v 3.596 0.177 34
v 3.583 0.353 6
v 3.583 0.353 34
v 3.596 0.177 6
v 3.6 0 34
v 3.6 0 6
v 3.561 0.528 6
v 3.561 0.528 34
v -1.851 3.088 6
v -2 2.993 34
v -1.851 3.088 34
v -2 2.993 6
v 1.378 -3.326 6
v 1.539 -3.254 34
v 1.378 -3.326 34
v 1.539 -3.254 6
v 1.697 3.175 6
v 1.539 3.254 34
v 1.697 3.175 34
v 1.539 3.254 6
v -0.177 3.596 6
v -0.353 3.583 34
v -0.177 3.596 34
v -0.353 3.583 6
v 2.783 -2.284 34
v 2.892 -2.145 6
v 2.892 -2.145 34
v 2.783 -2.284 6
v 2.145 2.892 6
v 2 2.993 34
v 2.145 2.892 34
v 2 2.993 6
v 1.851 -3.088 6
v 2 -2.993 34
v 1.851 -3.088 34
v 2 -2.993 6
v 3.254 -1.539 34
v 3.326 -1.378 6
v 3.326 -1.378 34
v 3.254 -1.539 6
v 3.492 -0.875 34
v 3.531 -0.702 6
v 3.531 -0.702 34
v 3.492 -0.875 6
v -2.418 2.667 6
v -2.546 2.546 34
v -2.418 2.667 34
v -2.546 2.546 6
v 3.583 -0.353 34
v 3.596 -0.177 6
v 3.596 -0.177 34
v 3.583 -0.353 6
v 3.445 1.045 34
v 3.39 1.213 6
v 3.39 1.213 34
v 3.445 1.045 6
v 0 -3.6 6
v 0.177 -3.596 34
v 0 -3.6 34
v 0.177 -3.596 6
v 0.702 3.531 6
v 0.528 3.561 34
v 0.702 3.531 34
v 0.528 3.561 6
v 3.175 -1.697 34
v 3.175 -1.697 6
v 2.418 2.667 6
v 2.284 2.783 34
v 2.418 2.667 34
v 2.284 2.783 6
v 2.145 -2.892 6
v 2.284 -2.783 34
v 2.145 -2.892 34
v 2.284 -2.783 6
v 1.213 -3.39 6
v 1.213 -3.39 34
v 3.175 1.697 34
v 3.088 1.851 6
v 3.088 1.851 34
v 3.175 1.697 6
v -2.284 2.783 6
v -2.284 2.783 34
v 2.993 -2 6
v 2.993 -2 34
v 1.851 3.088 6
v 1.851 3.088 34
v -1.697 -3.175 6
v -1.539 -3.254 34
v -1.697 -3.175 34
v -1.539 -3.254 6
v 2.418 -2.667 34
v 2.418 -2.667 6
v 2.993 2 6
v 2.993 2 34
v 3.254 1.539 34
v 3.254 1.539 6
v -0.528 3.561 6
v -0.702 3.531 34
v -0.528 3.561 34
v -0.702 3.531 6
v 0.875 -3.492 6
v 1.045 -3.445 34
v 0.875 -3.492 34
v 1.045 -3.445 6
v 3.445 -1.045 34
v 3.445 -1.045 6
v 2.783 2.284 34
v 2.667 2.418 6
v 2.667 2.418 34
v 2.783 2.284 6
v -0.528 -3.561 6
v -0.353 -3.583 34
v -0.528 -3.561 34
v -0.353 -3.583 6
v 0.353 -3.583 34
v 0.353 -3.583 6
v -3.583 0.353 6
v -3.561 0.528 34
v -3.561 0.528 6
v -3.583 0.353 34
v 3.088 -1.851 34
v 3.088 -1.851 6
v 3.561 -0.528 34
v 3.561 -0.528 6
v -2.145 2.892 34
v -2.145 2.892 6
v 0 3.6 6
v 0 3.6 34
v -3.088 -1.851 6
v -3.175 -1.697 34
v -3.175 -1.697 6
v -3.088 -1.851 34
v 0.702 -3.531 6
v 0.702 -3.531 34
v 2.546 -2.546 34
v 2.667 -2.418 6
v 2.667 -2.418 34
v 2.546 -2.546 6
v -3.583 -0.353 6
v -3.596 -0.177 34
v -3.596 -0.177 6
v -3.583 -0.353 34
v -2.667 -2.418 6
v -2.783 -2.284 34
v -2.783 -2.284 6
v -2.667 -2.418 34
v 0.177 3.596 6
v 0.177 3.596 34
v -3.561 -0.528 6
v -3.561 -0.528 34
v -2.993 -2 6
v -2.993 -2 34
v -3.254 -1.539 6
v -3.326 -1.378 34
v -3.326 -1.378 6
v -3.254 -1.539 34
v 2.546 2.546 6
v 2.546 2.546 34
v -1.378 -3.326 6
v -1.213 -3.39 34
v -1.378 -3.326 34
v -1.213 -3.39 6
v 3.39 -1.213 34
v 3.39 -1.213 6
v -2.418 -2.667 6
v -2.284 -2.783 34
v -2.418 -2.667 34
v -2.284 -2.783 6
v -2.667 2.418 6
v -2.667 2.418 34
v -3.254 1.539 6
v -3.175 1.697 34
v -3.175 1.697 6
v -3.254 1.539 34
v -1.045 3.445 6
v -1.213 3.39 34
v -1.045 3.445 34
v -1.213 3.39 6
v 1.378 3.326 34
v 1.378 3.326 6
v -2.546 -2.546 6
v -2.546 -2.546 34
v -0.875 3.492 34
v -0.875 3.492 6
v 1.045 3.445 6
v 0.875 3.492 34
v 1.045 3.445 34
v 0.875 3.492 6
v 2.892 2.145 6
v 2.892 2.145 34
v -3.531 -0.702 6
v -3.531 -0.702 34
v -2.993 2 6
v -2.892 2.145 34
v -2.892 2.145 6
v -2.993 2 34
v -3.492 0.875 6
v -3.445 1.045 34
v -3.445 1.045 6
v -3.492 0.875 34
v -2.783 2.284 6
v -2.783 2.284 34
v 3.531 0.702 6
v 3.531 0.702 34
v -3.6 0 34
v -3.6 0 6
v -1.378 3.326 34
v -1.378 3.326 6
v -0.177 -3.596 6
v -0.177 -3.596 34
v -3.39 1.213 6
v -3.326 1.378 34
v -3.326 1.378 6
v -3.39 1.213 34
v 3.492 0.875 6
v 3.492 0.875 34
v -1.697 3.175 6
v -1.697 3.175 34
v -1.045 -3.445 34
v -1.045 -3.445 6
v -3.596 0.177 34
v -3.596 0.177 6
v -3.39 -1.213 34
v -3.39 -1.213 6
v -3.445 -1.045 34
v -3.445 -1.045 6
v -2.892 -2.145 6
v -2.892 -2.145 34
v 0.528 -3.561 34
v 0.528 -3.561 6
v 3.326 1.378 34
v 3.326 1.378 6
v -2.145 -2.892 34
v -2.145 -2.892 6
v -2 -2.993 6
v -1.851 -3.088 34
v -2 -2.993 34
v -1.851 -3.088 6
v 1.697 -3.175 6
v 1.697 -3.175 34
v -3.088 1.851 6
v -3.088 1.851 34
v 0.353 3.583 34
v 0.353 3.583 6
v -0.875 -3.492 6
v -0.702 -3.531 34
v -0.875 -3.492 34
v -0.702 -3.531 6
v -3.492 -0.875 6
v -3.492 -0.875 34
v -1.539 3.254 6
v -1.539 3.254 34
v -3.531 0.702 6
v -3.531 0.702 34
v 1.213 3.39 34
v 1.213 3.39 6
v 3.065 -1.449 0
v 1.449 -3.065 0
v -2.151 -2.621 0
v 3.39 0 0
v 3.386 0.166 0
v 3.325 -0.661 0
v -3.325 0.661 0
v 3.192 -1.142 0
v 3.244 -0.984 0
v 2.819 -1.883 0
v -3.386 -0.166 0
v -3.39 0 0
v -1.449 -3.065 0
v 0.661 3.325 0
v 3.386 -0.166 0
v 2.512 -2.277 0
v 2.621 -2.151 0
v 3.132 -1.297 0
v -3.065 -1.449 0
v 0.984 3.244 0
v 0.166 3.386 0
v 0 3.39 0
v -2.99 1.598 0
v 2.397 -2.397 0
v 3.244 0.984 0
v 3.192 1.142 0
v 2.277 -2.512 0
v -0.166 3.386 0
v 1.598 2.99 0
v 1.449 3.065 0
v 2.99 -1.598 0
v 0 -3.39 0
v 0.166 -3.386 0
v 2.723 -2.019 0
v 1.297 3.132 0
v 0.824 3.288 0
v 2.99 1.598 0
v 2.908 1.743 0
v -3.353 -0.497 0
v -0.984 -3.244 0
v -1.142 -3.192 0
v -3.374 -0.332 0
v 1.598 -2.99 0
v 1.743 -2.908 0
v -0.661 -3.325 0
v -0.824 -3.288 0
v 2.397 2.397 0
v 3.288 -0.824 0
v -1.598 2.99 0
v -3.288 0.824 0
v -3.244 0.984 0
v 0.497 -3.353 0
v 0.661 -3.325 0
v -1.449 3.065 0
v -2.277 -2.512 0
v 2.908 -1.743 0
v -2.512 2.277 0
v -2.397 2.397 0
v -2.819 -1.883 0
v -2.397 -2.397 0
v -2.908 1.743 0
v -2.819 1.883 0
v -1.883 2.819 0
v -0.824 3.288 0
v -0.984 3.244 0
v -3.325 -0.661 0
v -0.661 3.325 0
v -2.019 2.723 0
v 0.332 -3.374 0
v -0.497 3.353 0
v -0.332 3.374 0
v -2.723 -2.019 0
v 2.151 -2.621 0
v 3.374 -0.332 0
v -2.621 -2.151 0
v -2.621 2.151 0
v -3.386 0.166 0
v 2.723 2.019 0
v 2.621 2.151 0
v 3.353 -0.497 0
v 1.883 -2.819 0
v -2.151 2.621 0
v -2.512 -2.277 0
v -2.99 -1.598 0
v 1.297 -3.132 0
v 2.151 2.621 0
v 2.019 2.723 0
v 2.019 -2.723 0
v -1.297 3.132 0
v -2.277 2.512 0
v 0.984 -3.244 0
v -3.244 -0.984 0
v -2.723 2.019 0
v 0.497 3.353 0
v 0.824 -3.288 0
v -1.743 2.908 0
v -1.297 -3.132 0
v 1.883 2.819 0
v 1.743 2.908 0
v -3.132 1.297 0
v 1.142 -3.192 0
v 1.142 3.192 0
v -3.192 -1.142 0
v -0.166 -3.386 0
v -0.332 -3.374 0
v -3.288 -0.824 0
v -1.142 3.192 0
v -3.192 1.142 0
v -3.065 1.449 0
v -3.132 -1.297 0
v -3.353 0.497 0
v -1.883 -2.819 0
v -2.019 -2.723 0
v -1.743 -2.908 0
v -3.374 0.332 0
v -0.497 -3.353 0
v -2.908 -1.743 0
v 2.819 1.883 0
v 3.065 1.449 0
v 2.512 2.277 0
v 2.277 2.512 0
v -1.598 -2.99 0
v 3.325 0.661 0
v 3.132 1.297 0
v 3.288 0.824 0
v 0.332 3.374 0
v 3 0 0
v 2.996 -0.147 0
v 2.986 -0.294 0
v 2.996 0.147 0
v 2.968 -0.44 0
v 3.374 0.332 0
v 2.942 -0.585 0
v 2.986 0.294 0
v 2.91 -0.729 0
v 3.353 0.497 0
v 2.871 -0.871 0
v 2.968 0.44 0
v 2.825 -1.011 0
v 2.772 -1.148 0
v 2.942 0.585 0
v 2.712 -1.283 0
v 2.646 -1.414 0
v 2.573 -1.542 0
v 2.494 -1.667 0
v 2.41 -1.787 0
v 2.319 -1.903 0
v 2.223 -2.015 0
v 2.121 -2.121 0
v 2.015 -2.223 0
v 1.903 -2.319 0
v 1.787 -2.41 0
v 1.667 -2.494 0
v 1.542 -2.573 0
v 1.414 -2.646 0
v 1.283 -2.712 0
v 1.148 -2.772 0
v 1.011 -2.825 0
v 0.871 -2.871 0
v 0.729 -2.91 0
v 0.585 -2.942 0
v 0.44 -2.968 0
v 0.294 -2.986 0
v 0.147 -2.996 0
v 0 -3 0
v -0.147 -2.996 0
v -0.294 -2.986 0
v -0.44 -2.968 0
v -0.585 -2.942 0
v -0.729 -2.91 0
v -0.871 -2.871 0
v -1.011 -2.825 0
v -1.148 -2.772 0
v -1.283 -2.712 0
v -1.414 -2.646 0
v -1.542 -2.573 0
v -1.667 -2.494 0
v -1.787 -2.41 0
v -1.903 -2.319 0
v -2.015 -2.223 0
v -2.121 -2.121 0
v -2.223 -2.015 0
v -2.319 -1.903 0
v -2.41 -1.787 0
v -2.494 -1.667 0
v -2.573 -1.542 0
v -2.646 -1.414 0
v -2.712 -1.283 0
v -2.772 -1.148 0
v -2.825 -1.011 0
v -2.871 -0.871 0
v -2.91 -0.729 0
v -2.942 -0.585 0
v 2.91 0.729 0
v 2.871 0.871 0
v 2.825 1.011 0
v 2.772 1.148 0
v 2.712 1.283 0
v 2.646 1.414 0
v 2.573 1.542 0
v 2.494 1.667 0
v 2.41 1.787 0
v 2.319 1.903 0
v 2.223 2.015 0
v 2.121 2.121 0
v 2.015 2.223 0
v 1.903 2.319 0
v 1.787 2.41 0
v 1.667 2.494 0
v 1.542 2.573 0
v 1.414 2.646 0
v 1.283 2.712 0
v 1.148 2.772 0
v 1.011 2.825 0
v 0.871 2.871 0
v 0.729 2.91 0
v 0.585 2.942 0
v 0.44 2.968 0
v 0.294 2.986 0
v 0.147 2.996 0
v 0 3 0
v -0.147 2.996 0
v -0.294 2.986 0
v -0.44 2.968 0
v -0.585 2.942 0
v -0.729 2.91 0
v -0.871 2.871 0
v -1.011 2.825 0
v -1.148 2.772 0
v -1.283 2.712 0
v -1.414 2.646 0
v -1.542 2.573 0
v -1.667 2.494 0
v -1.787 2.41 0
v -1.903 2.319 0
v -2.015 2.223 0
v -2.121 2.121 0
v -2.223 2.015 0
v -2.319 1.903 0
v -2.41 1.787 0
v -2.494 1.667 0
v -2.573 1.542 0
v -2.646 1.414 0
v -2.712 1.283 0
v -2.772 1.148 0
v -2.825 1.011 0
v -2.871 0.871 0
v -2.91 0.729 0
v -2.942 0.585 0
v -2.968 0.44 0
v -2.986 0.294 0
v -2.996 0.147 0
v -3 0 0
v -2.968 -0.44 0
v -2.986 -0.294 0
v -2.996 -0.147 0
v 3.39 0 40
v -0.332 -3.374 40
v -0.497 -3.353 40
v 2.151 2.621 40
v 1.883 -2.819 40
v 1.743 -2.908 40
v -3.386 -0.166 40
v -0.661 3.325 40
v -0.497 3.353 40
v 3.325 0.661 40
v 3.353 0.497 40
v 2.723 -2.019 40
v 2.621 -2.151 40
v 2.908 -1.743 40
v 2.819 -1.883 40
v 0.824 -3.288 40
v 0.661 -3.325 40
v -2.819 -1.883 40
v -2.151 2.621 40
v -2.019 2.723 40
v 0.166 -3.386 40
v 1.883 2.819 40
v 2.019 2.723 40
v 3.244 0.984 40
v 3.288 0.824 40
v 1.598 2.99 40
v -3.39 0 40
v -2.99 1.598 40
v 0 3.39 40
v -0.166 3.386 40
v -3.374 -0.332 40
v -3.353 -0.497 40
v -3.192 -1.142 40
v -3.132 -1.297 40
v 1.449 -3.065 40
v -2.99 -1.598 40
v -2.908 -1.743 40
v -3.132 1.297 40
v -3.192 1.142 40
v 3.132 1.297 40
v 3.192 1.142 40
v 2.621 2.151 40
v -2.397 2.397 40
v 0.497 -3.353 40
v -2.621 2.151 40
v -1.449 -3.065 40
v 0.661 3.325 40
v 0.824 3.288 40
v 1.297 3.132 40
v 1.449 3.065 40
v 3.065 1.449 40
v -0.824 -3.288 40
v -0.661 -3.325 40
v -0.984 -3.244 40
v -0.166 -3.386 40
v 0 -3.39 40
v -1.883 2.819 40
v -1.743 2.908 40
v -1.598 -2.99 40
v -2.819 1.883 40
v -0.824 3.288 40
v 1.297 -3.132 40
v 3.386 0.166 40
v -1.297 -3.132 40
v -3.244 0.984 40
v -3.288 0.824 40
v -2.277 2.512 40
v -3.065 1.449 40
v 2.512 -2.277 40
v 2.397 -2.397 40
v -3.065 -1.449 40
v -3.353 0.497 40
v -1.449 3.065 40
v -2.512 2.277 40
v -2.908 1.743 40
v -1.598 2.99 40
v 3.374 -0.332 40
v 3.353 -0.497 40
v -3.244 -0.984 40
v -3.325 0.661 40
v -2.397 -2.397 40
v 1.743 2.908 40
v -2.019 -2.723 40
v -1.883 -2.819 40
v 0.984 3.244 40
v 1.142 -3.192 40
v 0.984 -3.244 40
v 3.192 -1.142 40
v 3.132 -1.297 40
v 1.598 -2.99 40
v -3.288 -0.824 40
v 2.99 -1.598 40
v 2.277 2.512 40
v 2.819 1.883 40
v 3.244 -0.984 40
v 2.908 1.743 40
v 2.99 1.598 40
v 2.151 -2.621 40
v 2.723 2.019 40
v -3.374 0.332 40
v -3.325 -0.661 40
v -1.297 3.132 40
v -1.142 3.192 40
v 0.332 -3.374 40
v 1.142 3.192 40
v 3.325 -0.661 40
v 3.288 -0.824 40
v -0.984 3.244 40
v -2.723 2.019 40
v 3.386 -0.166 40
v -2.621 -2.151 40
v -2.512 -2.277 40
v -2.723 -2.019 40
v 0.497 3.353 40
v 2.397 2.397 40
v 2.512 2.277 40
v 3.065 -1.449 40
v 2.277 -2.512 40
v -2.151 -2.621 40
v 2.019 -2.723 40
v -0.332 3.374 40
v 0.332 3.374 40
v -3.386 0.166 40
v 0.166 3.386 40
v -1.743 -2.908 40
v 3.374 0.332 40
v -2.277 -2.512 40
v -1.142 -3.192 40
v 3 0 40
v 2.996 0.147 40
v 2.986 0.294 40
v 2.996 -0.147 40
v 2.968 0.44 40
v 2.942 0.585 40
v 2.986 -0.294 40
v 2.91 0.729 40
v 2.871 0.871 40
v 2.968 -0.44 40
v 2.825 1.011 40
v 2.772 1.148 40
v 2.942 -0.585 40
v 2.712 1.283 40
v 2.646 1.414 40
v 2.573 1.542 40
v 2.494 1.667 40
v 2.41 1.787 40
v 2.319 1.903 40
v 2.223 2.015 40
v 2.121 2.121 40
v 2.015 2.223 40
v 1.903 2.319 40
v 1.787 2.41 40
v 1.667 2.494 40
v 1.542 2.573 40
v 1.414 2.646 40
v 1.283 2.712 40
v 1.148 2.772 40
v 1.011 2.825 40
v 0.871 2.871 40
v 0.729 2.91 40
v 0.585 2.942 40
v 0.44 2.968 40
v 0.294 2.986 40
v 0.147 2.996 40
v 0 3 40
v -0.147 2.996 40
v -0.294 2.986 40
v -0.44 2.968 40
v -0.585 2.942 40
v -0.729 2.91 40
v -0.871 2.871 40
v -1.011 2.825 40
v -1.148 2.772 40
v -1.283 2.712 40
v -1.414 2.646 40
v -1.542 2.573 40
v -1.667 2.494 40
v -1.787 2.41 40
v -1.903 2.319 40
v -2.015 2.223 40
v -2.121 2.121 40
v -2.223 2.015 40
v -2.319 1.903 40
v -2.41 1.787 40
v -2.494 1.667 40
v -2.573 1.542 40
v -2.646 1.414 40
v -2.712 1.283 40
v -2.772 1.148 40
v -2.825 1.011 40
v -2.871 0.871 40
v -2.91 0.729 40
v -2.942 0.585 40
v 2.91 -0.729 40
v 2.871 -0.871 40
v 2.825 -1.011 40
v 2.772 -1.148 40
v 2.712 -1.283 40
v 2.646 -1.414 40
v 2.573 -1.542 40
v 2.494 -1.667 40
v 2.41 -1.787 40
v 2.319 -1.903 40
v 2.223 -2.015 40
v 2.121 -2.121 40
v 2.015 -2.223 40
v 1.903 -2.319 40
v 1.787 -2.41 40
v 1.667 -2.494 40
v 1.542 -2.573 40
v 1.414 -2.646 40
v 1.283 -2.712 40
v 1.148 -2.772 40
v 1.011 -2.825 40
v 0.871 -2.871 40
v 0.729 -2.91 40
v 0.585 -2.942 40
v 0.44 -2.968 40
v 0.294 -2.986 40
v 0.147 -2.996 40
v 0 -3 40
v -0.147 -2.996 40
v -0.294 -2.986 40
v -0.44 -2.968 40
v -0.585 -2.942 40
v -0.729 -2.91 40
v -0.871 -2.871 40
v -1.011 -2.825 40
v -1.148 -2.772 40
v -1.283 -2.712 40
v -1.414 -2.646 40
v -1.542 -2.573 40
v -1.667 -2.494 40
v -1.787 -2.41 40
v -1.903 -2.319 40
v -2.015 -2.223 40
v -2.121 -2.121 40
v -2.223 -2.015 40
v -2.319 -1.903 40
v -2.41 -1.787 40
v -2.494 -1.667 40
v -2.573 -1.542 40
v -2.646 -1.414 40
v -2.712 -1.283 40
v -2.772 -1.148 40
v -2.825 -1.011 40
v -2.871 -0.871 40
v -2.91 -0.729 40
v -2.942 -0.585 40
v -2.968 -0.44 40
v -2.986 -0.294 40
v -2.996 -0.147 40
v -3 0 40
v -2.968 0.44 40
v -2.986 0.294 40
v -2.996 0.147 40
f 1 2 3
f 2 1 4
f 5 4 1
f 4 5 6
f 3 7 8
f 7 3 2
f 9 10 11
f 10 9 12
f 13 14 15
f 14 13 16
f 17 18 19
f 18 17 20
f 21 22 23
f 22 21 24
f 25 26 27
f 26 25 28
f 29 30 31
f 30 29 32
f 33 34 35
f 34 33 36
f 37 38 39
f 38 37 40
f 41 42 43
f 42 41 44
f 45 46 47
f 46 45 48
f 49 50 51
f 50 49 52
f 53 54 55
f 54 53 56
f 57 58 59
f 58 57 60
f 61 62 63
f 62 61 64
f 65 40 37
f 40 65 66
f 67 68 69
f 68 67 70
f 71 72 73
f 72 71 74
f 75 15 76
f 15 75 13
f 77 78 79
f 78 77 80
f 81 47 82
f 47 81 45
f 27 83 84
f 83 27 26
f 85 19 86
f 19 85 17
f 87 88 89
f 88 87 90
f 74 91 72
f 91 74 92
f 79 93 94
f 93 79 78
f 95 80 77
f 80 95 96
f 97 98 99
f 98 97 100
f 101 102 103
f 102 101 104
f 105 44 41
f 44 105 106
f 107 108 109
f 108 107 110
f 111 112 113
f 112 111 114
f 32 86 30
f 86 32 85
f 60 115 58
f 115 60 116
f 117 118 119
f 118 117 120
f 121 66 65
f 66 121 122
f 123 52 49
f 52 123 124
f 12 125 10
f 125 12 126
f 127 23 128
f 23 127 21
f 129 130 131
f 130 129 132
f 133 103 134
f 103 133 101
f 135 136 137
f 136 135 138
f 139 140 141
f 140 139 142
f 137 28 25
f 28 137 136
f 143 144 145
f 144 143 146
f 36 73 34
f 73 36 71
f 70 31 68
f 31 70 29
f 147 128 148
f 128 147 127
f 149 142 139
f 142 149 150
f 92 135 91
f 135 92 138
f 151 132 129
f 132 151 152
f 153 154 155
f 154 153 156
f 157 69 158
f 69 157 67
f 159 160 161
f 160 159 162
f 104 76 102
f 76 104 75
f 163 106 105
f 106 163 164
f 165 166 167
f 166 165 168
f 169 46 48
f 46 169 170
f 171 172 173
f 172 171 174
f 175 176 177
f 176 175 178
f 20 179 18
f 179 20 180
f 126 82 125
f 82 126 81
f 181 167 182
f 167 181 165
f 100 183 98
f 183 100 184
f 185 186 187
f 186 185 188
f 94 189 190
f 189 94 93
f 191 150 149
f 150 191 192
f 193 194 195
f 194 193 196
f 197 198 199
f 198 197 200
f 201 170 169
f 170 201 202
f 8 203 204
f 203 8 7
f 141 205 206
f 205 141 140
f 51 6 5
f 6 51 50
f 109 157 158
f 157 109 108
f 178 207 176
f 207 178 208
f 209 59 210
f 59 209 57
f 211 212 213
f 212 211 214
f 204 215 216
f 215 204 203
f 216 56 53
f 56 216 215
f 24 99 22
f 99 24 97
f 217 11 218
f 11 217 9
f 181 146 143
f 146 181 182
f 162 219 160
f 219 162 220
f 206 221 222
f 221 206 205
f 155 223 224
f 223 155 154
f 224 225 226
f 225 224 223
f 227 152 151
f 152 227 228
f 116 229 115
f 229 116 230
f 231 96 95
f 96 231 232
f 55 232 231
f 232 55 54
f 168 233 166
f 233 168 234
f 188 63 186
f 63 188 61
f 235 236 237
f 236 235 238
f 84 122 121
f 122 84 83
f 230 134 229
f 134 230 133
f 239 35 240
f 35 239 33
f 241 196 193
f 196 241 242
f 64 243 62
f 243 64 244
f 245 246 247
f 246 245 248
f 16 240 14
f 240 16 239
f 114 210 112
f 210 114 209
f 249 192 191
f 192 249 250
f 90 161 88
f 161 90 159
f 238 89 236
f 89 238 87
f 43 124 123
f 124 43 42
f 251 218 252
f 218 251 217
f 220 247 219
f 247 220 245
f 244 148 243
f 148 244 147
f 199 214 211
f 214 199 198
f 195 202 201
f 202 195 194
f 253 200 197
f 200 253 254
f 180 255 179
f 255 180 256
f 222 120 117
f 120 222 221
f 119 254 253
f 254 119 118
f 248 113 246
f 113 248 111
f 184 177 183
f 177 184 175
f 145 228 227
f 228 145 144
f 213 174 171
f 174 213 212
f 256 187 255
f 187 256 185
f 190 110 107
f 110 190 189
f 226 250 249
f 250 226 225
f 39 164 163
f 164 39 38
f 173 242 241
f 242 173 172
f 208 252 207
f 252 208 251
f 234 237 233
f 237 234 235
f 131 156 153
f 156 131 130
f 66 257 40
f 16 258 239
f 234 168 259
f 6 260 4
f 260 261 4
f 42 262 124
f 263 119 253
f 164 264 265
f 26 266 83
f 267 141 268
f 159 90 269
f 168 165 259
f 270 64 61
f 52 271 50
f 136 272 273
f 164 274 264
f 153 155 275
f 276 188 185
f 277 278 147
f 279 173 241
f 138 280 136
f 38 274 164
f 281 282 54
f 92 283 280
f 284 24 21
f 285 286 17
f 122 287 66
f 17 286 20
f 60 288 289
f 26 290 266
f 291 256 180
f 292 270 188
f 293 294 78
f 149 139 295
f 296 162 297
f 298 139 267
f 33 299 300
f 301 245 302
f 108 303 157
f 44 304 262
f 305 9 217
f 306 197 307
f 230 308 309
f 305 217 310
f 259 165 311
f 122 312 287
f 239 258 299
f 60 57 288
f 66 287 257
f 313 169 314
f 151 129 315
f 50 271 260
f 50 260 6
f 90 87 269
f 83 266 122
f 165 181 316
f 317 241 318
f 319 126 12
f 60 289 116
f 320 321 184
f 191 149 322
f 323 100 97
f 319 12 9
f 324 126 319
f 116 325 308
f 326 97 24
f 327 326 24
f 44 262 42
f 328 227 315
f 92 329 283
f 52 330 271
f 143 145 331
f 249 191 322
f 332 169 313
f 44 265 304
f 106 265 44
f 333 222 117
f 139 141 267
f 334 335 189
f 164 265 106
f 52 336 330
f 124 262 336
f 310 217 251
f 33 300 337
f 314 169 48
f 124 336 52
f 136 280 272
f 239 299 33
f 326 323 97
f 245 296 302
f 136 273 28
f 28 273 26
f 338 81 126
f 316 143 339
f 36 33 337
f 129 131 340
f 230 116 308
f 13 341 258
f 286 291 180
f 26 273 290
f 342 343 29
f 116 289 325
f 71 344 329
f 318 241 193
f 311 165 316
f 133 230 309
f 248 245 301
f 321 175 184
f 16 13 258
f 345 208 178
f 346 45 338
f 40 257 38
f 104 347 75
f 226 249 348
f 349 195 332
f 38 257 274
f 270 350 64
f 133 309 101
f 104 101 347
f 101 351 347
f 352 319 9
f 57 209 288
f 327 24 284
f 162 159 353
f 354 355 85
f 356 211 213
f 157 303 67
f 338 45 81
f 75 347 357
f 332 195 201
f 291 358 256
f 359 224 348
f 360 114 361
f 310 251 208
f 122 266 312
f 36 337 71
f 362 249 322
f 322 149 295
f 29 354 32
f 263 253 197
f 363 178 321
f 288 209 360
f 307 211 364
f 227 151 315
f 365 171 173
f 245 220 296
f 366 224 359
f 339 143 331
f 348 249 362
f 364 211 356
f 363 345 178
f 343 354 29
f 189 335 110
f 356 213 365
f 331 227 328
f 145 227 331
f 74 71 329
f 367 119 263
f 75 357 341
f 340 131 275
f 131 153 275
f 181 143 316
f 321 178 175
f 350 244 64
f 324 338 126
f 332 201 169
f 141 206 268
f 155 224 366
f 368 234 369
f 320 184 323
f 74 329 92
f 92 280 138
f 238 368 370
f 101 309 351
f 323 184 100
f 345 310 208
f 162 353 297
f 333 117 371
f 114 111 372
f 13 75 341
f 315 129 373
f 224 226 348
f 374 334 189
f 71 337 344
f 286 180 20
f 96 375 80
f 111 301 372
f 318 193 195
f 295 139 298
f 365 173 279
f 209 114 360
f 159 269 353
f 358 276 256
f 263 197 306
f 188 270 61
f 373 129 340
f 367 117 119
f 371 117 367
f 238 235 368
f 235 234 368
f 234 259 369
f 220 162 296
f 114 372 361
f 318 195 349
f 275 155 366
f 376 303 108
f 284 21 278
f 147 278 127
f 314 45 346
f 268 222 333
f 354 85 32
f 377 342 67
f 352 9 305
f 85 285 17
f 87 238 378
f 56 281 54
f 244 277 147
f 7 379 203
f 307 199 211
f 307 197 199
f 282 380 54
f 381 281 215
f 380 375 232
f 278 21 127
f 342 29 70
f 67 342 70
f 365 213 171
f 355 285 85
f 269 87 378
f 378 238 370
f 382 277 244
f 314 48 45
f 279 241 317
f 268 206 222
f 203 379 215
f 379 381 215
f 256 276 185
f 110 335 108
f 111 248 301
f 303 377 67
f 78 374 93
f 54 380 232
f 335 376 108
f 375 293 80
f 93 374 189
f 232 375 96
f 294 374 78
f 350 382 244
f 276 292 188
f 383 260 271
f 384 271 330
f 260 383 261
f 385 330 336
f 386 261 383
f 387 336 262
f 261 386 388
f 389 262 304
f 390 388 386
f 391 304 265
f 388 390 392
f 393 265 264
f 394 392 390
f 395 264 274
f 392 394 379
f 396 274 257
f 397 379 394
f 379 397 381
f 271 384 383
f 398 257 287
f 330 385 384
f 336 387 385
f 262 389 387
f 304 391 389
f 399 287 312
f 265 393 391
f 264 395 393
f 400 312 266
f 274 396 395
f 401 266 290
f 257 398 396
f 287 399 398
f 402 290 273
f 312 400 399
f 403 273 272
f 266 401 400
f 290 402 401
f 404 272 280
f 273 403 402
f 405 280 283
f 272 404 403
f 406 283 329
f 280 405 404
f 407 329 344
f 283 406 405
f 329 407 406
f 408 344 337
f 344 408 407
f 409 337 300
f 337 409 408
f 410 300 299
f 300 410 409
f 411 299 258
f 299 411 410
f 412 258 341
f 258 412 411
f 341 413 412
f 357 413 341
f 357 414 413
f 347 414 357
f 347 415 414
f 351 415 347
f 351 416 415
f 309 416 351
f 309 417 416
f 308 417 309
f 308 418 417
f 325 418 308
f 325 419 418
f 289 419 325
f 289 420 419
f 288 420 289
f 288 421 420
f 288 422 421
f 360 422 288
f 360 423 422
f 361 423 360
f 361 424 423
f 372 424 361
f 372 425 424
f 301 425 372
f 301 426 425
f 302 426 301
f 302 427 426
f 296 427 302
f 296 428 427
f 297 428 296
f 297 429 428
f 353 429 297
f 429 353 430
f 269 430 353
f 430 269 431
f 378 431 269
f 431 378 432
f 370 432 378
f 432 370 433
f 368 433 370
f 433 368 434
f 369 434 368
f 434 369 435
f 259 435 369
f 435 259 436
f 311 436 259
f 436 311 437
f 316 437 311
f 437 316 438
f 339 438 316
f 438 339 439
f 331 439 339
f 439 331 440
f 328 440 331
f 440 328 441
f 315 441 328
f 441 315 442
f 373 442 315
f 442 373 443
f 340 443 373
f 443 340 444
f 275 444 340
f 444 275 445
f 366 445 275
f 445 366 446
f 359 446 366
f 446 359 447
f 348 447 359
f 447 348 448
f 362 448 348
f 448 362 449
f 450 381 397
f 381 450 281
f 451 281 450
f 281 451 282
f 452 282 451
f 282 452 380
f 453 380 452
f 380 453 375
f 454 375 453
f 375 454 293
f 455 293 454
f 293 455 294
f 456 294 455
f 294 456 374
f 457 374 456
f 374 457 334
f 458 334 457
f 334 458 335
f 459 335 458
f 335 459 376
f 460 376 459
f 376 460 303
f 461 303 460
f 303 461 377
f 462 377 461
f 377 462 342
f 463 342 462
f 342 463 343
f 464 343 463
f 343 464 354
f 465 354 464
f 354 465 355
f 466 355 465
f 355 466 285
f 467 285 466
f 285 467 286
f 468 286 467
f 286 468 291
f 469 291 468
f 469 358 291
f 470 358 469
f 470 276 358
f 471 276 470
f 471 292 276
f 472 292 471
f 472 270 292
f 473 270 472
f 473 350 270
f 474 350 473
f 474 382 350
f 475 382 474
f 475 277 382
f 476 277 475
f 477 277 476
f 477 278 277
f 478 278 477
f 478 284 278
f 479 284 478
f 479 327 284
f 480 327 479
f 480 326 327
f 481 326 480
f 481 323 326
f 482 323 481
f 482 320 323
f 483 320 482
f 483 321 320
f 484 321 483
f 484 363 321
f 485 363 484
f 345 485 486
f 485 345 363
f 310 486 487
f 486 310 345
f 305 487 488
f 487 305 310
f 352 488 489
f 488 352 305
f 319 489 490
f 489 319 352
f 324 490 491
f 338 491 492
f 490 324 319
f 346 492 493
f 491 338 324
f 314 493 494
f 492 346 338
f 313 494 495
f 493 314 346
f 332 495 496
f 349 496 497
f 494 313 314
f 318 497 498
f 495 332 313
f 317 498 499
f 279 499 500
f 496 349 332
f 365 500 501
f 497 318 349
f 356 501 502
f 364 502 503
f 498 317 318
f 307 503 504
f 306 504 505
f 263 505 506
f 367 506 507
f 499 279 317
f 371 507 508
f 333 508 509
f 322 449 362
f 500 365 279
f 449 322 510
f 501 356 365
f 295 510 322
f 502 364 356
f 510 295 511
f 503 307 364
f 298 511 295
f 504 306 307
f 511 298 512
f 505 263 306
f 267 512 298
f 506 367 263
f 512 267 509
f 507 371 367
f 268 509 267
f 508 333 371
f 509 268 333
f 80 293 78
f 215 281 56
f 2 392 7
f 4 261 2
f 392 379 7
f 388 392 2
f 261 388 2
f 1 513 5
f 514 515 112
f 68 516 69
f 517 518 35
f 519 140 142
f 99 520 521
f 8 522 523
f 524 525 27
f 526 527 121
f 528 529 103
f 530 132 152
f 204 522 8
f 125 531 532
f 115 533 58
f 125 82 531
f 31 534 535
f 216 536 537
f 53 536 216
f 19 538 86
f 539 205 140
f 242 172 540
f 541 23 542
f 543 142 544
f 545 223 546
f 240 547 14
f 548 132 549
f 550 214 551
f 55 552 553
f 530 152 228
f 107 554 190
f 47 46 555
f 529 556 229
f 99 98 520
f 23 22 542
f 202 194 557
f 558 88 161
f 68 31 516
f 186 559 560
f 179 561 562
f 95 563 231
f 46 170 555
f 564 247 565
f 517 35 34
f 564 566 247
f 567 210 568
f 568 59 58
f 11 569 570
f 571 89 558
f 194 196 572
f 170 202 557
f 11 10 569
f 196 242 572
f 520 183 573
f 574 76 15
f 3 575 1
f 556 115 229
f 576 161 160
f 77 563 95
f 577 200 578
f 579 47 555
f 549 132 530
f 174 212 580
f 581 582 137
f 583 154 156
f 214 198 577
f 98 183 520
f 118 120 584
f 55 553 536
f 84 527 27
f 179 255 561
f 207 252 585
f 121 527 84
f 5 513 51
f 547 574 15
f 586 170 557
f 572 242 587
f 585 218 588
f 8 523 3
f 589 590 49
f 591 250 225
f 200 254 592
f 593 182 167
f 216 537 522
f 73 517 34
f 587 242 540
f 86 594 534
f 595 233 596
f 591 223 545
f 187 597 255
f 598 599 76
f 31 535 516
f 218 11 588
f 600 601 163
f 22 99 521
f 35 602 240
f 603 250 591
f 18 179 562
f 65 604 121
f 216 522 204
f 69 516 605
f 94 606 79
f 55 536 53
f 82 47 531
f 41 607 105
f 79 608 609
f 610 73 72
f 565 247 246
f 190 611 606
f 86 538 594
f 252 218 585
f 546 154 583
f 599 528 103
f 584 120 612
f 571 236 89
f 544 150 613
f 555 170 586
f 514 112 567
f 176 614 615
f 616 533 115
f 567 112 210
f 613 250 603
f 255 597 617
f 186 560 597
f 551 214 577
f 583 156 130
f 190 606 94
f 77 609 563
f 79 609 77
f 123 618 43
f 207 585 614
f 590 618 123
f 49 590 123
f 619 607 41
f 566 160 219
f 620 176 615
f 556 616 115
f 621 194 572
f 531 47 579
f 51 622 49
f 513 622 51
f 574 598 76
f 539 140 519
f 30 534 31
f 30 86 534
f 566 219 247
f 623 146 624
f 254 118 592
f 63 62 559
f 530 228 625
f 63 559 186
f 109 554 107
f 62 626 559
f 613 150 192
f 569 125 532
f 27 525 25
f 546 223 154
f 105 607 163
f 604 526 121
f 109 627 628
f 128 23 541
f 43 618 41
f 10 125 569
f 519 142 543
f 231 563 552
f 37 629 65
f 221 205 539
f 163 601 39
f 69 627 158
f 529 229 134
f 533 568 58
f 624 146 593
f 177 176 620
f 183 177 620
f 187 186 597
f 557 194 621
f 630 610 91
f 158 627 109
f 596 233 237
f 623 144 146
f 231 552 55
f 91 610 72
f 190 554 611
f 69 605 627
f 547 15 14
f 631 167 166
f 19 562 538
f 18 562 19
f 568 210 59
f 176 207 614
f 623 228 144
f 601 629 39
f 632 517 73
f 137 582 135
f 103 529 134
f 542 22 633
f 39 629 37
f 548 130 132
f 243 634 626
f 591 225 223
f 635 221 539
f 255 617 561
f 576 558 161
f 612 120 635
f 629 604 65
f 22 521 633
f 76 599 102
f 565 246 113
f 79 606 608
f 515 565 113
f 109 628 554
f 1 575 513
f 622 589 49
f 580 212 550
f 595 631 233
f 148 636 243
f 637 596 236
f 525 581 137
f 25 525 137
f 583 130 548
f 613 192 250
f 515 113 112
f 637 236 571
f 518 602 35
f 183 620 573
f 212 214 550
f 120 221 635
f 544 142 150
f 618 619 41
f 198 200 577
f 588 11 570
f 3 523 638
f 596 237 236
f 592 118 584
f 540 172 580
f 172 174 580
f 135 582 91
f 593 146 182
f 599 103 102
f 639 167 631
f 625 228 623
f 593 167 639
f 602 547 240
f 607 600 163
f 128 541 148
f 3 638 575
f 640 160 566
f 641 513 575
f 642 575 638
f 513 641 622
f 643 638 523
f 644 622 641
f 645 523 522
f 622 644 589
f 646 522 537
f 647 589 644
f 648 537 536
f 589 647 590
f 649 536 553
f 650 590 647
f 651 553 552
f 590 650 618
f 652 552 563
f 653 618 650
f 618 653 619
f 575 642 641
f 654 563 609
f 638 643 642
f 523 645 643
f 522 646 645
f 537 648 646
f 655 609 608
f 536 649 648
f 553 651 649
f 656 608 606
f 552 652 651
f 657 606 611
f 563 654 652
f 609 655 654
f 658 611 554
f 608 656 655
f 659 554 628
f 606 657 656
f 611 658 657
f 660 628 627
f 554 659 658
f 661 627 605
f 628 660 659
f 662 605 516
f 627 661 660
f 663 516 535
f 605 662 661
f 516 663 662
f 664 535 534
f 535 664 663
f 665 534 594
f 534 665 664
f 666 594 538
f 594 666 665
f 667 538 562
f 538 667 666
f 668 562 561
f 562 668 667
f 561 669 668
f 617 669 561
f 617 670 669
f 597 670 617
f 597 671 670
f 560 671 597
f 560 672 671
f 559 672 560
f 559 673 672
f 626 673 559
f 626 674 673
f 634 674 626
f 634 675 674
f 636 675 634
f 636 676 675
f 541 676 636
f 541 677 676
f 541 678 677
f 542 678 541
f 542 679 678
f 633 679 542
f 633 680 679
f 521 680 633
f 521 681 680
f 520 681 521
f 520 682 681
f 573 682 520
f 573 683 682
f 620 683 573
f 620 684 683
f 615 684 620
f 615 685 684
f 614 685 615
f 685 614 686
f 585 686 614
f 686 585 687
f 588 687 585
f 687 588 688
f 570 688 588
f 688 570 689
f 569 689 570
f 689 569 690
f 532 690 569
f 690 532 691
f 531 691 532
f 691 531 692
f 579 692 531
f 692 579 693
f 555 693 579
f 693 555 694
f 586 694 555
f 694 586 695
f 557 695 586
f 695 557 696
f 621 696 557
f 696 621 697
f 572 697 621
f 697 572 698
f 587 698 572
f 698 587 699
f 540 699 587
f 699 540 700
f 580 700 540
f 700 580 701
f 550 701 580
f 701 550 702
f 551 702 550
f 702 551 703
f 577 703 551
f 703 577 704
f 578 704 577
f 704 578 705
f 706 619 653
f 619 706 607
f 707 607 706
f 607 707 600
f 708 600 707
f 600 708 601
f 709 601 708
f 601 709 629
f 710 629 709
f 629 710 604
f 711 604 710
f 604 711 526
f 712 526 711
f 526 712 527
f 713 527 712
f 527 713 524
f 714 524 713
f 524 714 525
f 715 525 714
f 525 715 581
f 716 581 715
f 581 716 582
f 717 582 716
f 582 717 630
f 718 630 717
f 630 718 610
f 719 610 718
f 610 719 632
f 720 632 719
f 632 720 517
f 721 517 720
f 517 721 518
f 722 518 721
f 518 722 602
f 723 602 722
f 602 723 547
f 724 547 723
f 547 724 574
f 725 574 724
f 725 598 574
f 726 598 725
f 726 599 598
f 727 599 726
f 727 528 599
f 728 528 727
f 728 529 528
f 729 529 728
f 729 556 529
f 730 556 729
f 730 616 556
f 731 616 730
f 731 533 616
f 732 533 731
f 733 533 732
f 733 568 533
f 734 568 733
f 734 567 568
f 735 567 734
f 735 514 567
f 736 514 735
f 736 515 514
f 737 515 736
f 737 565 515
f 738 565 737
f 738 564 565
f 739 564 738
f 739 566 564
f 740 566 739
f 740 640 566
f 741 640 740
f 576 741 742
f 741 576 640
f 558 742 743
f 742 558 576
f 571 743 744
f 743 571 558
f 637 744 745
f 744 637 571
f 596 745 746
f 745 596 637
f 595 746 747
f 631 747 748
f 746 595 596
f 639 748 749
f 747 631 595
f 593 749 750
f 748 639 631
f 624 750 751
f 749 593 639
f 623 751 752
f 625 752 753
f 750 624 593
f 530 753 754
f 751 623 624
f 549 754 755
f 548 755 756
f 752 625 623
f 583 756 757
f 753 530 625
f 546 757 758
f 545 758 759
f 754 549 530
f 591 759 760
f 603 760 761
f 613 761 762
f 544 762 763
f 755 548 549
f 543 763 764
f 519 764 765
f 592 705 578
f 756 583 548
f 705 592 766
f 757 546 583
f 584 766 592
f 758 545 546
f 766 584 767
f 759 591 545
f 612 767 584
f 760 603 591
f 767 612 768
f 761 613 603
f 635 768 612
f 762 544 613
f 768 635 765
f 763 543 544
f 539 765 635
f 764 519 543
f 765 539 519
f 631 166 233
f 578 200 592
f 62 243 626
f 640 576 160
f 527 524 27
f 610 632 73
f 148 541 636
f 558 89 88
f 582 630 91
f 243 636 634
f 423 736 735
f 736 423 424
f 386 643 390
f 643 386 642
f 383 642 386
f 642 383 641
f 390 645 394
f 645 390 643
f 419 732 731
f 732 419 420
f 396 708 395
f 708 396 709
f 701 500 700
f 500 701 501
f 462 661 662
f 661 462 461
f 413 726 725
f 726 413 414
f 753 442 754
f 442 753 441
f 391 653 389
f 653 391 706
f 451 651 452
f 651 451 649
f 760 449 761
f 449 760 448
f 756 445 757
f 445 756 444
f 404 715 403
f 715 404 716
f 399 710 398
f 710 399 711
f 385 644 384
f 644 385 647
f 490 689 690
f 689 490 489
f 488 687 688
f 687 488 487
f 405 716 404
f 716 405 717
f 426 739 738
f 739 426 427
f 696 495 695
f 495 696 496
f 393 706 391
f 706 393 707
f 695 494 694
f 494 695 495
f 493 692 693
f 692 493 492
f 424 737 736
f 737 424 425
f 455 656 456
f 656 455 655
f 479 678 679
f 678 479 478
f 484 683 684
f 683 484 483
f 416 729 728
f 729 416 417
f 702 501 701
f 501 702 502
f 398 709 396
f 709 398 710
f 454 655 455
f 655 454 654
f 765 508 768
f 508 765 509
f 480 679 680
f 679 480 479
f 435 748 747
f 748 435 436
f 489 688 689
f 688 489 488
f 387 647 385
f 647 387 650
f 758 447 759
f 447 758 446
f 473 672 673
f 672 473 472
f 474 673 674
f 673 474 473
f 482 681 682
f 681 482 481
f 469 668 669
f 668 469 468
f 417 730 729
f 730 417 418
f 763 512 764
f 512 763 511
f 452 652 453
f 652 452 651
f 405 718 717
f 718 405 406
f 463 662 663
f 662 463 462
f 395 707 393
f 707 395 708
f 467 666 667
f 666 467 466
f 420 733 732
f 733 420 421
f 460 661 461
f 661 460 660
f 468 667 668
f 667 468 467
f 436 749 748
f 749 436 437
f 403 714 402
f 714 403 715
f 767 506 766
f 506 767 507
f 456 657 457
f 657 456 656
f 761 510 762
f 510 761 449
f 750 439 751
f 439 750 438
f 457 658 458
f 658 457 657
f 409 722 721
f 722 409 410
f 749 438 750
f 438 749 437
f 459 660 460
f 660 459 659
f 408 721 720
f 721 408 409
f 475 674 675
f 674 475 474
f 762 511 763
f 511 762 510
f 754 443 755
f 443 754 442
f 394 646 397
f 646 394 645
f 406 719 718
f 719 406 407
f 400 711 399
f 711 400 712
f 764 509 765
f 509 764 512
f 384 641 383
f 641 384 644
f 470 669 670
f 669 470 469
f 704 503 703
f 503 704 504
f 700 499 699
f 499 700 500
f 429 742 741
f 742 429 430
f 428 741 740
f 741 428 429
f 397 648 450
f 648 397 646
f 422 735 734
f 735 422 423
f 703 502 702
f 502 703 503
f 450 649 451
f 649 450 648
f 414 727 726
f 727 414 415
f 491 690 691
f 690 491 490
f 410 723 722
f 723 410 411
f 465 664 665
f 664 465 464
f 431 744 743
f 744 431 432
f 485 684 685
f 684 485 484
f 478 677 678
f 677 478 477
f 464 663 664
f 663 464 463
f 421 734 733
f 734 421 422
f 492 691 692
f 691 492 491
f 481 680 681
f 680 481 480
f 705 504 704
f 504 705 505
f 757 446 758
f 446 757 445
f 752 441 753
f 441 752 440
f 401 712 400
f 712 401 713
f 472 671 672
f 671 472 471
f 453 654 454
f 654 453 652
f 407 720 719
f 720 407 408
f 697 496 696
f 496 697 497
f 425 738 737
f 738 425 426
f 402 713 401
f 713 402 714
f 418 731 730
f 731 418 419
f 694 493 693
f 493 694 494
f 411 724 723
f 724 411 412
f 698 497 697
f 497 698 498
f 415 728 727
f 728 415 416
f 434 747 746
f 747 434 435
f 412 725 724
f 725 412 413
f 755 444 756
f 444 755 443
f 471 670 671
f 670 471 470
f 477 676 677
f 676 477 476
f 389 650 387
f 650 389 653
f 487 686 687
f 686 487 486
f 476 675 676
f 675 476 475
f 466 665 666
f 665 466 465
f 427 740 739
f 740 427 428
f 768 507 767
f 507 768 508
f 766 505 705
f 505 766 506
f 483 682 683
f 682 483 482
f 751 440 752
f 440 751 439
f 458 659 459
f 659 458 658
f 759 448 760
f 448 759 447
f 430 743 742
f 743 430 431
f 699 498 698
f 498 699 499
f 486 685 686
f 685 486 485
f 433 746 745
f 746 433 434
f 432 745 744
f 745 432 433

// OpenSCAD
$fn=128;

// Heatshrink sleeving (tubing) parameters
inner_d = 6;          // inner diameter (mm)
wall = 0.6;           // wall thickness (mm)
length = 40;          // length (mm)
taper_len = 6;        // tapered lead-in length at each end (mm)
end_thin_factor = 0.65; // wall thickness factor at ends (0..1), thinner ends look more realistic

outer_d_mid = inner_d + 2*wall;
outer_d_end = inner_d + 2*(wall*end_thin_factor);

module heatshrink_sleeve(id=inner_d, wall=wall, L=length, taper=taper_len, end_factor=end_thin_factor) {
    od_mid = id + 2*wall;
    od_end = id + 2*(wall*end_factor);

    difference() {
        // Outer surface with slight taper at both ends
        union() {
            // Middle straight section
            translate([0,0,taper])
                cylinder(h=max(0, L-2*taper), d=od_mid);

            // Bottom taper
            cylinder(h=taper, d1=od_end, d2=od_mid);

            // Top taper
            translate([0,0,L-taper])
                cylinder(h=taper, d1=od_mid, d2=od_end);
        }

        // Inner bore (straight)
        translate([0,0,-0.5])
            cylinder(h=L+1, d=id);
    }
}

heatshrink_sleeve();
